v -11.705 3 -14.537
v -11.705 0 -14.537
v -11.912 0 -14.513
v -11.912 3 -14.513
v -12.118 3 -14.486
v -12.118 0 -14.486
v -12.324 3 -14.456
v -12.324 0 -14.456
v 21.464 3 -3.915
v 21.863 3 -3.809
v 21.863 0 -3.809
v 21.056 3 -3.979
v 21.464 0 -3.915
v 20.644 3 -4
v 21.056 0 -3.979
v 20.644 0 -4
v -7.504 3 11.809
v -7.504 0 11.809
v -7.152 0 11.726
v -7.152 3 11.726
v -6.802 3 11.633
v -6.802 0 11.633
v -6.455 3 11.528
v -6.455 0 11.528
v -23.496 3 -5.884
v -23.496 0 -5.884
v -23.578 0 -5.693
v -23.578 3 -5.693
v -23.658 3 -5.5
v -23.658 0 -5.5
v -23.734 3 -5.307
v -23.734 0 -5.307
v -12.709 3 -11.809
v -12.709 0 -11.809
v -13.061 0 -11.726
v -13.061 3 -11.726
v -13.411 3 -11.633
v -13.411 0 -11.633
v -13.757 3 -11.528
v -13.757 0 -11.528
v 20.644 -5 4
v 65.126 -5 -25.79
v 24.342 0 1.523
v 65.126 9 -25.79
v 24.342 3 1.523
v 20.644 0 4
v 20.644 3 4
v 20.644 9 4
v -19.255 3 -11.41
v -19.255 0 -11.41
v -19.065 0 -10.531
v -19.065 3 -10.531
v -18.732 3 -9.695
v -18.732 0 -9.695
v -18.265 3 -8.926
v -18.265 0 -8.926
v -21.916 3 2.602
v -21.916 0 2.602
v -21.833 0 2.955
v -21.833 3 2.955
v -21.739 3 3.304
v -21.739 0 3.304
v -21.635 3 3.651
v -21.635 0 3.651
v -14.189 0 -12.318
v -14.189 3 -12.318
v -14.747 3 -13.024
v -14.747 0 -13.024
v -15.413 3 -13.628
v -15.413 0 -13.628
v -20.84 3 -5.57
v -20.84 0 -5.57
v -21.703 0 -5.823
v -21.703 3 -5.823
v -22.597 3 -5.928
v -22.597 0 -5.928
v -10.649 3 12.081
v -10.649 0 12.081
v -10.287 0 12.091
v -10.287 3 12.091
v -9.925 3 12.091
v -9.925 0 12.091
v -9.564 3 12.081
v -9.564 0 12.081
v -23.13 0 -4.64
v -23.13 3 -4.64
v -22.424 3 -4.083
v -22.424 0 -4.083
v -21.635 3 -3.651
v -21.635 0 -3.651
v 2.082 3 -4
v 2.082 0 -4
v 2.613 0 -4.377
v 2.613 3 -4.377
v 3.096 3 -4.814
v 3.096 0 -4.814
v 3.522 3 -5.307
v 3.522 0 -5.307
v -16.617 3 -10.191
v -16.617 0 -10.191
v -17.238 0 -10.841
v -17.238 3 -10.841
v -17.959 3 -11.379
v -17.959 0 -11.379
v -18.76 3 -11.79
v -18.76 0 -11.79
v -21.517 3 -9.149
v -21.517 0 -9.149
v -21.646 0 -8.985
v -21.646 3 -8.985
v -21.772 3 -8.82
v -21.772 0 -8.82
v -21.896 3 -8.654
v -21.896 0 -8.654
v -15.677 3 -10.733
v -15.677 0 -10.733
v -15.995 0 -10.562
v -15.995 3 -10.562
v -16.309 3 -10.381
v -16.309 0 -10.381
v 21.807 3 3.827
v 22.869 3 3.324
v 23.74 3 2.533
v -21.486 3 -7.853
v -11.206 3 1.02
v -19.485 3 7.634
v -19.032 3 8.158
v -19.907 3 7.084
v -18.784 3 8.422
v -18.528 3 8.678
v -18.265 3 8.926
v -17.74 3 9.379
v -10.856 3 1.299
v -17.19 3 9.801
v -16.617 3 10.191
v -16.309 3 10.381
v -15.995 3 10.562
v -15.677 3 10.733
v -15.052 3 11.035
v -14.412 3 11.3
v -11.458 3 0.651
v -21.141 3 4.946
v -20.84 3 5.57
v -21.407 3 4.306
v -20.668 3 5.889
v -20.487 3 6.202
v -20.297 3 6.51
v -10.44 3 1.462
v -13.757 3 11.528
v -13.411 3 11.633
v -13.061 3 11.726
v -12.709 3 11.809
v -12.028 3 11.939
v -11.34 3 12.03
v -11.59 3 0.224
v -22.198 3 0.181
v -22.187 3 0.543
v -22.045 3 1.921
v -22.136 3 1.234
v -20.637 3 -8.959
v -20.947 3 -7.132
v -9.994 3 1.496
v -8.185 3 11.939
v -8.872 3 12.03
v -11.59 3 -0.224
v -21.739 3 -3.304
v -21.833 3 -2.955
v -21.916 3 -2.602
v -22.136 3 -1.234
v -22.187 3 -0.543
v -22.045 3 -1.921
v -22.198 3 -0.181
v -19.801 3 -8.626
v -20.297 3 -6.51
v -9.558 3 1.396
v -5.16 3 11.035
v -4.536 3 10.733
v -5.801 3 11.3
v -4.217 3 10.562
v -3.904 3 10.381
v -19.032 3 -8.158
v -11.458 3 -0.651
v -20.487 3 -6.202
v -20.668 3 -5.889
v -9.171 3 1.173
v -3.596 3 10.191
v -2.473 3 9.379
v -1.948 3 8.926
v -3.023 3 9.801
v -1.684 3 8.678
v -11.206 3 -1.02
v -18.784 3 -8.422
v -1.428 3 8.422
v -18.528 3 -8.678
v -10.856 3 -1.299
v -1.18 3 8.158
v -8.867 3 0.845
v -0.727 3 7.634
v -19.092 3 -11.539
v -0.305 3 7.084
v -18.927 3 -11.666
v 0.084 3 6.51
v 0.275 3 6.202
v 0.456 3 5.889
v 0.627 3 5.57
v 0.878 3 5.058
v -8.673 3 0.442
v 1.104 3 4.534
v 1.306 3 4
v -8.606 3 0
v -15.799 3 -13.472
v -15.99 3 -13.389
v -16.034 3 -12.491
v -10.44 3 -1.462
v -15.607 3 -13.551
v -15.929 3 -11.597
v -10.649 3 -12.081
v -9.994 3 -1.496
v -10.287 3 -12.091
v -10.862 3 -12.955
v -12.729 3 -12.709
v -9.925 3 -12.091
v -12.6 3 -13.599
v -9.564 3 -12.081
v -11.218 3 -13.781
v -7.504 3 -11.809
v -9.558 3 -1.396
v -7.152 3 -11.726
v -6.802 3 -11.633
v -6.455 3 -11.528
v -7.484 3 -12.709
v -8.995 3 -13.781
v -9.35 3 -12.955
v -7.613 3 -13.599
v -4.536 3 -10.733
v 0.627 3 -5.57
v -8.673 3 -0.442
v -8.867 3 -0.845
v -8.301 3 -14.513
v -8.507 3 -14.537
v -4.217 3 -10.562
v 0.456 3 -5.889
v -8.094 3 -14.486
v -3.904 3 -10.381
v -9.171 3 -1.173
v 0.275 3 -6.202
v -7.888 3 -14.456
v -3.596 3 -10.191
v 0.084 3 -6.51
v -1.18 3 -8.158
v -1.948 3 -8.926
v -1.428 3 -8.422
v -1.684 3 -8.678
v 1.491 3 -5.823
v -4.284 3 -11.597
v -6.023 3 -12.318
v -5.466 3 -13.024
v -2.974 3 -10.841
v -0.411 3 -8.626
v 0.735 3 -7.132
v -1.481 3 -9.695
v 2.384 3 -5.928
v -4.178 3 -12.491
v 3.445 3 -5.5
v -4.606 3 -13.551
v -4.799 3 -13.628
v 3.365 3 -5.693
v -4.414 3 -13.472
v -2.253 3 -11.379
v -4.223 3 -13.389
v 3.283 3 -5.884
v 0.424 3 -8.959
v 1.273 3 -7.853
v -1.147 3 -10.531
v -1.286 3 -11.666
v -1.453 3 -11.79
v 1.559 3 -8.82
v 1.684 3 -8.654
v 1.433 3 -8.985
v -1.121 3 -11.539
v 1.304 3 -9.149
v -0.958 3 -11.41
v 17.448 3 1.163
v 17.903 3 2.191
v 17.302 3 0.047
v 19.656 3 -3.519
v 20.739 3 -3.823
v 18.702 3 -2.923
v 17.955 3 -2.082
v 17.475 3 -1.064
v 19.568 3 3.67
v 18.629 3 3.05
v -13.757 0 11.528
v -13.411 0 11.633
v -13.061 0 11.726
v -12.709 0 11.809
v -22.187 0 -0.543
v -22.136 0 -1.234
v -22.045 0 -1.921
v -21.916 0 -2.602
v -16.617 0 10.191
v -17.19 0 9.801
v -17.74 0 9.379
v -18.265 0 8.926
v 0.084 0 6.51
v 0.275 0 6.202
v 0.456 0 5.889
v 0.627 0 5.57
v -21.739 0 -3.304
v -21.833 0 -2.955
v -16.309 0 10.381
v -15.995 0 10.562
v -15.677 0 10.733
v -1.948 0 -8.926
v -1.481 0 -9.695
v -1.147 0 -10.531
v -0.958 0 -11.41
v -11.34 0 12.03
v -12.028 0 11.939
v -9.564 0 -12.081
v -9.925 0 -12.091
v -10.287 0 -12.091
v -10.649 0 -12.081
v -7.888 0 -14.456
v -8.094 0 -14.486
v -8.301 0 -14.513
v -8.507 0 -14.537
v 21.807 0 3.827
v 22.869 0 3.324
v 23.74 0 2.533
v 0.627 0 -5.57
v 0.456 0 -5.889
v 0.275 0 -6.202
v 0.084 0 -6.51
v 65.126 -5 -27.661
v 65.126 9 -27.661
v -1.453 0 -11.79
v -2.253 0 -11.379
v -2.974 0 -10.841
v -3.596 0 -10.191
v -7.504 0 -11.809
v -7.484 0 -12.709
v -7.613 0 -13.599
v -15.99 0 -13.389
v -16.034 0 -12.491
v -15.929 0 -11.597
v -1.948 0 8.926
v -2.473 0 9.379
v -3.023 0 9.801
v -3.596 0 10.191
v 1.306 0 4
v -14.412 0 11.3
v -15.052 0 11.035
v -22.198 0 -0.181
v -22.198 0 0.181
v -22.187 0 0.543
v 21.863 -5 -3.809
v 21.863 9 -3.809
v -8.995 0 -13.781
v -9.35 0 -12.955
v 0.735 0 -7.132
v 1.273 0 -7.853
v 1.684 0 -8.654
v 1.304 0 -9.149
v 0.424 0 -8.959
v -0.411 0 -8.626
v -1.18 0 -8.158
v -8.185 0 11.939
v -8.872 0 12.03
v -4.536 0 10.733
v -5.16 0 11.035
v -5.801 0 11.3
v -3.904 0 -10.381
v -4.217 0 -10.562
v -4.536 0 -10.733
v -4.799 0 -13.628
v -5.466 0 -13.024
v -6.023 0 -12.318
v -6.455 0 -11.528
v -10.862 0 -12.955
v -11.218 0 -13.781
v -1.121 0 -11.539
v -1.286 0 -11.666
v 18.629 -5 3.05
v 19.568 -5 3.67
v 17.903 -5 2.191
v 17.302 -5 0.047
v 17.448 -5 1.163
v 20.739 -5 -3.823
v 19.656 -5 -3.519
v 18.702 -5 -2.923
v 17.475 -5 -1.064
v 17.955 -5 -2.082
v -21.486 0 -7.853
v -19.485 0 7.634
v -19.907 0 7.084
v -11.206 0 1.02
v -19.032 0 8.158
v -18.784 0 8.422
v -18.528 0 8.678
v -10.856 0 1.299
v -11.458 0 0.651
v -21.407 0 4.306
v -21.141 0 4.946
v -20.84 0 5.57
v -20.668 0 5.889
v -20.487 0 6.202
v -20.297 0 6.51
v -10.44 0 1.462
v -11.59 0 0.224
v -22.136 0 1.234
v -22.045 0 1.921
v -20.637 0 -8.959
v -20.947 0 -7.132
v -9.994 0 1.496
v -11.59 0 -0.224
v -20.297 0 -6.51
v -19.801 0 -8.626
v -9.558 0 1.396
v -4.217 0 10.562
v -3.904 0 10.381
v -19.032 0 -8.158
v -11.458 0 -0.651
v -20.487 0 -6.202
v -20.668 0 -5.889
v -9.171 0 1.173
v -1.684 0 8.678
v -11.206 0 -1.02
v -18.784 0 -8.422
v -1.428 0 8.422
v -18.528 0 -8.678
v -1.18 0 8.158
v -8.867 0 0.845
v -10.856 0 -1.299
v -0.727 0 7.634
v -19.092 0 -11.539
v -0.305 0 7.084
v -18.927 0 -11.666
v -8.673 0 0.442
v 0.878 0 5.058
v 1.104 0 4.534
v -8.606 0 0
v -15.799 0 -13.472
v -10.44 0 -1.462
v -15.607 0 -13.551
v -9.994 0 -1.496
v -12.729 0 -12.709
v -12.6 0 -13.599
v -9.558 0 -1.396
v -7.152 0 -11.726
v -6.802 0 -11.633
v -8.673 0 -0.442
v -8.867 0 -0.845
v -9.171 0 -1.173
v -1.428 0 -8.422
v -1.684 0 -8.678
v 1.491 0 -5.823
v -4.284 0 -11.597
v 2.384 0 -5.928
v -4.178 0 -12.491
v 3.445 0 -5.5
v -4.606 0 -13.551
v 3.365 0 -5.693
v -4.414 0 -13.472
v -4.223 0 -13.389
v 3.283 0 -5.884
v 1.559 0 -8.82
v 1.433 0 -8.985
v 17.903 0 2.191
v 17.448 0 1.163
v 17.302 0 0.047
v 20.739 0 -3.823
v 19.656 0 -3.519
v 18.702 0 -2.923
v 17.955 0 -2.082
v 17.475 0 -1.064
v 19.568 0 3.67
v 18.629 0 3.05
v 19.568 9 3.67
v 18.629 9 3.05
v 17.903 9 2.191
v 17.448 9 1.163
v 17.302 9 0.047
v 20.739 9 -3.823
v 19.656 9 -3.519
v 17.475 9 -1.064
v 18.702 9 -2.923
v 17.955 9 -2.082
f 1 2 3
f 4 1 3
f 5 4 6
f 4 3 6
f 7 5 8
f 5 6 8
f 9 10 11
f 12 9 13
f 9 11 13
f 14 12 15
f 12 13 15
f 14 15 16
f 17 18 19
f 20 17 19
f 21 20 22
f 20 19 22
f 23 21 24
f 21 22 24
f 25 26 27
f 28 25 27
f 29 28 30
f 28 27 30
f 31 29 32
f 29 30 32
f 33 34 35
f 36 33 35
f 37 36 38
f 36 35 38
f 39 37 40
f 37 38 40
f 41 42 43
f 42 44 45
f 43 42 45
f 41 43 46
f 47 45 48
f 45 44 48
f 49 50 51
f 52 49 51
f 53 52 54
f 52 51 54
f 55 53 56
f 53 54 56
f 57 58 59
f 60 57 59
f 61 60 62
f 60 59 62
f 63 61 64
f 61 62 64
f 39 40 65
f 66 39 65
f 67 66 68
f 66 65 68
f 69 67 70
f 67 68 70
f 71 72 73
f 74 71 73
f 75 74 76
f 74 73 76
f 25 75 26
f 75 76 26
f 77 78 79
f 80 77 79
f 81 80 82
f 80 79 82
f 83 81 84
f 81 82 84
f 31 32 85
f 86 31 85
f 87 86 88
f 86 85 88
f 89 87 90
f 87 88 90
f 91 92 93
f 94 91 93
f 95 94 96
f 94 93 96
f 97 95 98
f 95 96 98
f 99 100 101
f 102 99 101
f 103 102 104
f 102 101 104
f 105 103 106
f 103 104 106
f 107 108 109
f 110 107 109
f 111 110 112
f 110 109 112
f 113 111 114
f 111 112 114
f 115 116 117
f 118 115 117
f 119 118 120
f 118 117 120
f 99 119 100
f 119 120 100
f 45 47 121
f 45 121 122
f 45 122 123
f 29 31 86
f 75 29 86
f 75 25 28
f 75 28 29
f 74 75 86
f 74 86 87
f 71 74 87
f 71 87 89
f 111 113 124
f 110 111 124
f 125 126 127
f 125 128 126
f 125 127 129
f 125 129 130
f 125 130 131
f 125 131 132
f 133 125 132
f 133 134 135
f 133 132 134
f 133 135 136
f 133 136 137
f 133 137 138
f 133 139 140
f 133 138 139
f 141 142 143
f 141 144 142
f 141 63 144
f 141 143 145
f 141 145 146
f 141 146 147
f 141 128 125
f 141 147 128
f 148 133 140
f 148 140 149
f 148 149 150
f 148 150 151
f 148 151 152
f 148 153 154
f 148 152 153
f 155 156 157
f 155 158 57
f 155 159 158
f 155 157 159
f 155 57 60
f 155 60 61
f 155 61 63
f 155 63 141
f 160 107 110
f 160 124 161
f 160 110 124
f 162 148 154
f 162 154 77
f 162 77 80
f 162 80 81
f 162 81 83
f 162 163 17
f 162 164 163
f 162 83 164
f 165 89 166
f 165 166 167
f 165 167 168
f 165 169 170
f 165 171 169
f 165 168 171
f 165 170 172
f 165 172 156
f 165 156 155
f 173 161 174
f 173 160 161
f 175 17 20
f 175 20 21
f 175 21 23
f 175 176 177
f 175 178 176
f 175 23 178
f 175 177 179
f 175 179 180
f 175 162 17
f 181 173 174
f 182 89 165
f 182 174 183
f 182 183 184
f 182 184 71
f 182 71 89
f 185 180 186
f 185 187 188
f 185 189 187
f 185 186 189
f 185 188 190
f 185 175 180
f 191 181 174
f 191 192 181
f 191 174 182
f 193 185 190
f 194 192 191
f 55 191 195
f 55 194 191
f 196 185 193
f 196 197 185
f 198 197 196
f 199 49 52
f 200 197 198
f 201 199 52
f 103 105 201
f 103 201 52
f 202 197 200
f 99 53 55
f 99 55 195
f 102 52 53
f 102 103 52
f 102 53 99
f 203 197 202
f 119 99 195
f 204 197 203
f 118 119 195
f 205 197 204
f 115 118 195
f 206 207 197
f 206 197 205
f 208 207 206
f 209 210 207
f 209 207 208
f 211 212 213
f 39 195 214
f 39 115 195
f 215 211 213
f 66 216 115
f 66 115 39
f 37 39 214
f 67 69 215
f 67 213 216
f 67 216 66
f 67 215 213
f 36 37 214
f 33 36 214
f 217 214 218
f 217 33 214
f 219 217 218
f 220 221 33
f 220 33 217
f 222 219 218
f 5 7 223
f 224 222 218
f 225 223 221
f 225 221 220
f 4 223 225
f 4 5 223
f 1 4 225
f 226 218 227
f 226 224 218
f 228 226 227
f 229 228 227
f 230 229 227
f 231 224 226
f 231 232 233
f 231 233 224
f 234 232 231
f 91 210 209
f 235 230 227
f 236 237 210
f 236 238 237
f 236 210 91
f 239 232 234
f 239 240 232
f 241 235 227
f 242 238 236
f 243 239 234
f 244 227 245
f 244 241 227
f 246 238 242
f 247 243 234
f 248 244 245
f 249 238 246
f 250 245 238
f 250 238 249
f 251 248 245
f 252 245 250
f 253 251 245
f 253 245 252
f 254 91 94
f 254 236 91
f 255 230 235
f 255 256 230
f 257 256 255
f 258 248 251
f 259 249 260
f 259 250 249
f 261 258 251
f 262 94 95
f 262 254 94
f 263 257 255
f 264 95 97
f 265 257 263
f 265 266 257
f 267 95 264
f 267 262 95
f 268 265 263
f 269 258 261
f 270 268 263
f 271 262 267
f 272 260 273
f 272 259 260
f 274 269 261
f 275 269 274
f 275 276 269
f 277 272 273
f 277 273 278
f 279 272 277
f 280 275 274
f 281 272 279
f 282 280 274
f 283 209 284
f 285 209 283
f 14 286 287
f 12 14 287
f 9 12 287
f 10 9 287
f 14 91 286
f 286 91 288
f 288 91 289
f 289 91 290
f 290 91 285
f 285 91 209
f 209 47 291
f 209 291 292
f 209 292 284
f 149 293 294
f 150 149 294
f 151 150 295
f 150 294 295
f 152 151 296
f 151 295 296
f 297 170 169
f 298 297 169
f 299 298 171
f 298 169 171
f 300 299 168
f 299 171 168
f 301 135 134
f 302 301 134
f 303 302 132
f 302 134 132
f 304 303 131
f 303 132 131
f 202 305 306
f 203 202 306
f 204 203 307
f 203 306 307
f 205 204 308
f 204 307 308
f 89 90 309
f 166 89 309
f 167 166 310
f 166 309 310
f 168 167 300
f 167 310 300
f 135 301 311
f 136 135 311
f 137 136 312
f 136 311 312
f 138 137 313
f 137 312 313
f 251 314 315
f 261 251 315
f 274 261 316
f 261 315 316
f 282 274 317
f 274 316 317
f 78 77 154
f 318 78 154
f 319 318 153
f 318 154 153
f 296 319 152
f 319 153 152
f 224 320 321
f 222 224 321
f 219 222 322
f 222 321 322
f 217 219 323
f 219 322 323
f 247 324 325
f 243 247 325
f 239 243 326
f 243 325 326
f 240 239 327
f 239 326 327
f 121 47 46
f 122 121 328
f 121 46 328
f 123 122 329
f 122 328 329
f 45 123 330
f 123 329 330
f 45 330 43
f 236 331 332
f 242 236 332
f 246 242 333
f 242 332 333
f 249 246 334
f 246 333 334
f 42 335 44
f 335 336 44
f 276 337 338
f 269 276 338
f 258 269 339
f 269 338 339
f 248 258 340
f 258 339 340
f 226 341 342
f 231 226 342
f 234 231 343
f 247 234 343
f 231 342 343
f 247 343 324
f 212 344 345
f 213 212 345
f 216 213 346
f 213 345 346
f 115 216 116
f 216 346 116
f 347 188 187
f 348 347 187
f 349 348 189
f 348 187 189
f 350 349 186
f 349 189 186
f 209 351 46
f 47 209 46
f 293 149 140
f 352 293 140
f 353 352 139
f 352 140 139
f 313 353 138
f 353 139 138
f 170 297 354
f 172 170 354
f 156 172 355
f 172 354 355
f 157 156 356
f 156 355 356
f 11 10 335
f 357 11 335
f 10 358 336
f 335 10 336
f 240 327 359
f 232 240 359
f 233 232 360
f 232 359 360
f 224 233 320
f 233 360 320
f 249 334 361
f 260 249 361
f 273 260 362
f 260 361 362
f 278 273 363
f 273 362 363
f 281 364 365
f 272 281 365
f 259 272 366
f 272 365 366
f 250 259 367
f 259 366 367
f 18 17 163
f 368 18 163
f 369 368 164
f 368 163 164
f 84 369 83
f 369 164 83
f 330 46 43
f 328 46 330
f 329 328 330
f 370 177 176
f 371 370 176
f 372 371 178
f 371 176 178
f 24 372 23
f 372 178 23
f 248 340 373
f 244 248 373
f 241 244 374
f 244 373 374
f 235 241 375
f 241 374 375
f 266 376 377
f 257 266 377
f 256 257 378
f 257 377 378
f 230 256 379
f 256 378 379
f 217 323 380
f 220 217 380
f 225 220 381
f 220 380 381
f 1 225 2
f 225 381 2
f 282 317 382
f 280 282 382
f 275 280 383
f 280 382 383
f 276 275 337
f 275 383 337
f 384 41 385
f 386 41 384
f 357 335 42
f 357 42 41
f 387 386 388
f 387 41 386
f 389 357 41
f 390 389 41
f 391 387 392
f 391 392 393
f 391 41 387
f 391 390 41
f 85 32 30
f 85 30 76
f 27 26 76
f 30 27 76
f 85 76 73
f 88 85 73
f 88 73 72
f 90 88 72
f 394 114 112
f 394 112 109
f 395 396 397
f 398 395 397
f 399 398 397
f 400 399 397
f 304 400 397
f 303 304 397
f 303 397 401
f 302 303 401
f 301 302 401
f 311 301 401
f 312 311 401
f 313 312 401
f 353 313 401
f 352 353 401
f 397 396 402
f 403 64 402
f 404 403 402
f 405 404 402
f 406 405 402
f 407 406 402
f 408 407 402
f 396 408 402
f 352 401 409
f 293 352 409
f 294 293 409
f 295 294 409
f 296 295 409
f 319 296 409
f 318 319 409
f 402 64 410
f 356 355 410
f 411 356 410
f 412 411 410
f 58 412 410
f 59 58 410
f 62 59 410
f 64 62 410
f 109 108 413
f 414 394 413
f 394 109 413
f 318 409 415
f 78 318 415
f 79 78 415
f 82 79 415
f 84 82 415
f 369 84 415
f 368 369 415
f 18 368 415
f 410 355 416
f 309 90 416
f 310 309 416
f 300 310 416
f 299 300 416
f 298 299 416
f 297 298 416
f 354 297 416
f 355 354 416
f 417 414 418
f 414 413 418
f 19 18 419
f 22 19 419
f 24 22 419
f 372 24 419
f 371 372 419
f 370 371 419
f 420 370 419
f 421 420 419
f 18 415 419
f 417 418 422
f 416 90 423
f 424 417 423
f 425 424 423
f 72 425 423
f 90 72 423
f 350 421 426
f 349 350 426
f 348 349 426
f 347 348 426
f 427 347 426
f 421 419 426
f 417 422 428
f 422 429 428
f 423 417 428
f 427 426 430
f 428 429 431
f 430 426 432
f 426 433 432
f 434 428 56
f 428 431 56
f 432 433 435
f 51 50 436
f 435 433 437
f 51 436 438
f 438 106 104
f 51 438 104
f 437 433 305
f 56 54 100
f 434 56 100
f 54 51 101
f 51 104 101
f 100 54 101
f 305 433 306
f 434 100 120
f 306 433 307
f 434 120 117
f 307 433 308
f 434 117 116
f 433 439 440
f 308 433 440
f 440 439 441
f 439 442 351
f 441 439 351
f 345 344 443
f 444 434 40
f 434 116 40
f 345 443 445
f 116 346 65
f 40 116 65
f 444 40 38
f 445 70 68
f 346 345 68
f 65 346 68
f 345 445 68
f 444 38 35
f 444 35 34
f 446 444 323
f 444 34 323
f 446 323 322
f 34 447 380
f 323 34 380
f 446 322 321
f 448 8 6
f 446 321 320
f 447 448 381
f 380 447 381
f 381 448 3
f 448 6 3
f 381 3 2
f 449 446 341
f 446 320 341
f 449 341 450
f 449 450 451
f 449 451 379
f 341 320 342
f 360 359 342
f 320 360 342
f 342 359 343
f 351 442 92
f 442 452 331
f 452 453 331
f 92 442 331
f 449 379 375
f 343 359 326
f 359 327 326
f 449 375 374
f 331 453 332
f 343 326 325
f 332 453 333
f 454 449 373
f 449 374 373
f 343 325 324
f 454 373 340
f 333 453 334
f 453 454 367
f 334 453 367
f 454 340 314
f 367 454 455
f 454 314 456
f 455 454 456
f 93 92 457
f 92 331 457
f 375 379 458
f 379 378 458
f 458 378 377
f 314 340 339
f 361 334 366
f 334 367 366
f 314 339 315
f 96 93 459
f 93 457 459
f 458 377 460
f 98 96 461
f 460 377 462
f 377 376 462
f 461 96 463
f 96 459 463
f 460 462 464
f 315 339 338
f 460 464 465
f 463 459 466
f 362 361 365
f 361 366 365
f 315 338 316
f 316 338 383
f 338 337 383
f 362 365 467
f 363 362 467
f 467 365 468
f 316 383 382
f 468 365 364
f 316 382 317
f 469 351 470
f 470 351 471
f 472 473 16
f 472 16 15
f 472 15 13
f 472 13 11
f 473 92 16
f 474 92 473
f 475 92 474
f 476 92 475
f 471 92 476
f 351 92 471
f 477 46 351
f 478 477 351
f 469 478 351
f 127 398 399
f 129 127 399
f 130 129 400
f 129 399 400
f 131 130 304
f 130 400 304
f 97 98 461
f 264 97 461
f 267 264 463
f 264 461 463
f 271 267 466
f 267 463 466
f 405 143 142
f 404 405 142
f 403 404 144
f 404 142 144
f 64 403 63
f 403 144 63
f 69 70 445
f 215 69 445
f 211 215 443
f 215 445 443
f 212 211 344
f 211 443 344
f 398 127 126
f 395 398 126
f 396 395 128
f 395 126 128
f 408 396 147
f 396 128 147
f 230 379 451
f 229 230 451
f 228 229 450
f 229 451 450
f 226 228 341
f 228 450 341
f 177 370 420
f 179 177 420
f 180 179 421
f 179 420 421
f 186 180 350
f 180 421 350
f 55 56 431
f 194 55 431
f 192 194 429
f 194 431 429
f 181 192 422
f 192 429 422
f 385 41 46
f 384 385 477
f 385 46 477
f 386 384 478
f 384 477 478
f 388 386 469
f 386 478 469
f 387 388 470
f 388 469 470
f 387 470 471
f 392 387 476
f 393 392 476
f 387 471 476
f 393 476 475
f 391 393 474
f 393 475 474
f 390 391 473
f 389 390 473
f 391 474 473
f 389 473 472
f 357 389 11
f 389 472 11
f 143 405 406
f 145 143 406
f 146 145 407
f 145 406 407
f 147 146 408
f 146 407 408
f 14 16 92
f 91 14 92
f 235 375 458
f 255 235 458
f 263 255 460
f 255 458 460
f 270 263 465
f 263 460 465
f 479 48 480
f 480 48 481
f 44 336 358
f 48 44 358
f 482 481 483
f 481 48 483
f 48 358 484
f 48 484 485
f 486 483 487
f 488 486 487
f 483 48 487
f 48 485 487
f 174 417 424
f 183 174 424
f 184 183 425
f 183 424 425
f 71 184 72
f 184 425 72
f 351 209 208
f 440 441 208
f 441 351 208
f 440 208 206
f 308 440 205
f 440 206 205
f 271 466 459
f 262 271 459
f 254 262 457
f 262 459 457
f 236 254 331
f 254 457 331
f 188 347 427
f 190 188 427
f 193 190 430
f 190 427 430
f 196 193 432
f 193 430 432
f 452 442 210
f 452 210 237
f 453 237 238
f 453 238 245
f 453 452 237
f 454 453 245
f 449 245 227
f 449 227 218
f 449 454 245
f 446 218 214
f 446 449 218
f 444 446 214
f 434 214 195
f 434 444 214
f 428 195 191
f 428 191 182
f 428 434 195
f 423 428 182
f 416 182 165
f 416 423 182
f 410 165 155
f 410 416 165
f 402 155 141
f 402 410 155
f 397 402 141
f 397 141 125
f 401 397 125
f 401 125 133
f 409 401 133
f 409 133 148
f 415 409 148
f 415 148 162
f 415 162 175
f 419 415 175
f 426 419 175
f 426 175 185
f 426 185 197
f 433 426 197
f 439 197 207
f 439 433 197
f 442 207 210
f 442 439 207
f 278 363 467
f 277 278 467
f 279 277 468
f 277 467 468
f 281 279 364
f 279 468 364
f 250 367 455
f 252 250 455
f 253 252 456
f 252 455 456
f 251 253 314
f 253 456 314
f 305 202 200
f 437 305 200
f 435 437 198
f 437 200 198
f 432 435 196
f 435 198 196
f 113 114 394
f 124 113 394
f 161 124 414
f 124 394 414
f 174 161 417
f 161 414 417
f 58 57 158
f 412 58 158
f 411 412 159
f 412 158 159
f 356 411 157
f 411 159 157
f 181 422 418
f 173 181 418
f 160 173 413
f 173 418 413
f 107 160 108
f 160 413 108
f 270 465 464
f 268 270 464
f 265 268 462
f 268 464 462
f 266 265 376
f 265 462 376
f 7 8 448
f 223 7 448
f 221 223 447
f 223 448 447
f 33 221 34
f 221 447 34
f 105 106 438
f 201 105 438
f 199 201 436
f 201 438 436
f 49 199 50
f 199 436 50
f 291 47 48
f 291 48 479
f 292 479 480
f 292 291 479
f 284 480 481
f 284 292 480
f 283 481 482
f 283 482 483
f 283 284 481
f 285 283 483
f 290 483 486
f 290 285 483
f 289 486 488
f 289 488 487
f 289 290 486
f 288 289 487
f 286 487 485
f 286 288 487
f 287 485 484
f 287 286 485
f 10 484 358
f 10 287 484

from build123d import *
from build123d.topology import SkipClean

# Parameters (mm, degrees)
SKETCH1_R                = 1.5
BOSS_EXTRUDE1_DEPTH      = 3
CUT_EXTRUDE1_START       = -10
CUT_EXTRUDE1_DEPTH       = 10
BOSS_EXTRUDE2_DEPTH      = 6
BOSS_EXTRUDE2_DEPTH_BACK = 8


with BuildPart() as part:
    # Sketch1 → Boss-Extrude1 (new body)
    with BuildSketch(Plane(origin=(0, 0, 0), x_dir=(1, 0, 0), z_dir=(0, 1, 0))):
        with BuildLine():
            Line((20.643657446, 4), (2.081641936, 4))
            ThreePointArc((2.081641936, 4), (2.861028333, 4.588201733), (3.521749436, 5.30713988))
            ThreePointArc((3.521749436, 5.30713988), (3.405395609, 5.596745198), (3.282888305, 5.883801663))
            ThreePointArc((3.282888305, 5.883801663), (1.93527598, 5.894040025), (0.627094961, 5.57027124))
            ThreePointArc((0.627094961, 5.57027124), (0.366286148, 6.046375), (0.084372603, 6.510293938))
            ThreePointArc((0.084372603, 6.510293938), (1.018855105, 7.48132754), (1.683794586, 8.65351323))
            ThreePointArc((1.683794586, 8.65351323), (1.496450048, 8.903135899), (1.303821399, 9.148703928))
            ThreePointArc((1.303821399, 9.148703928), (-0.000522033, 8.809805691), (-1.180330337, 8.158486898))
            ThreePointArc((-1.180330337, 8.158486898), (-1.555477026, 8.550865528), (-1.947855656, 8.926012217))
            ThreePointArc((-1.947855656, 8.926012217), (-1.296536862, 10.105820521), (-0.957638625, 11.410163953))
            ThreePointArc((-0.957638625, 11.410163953), (-1.203206655, 11.602792602), (-1.452829324, 11.79013714))
            ThreePointArc((-1.452829324, 11.79013714), (-2.625015014, 11.125197659), (-3.596048616, 10.190715157))
            ThreePointArc((-3.596048616, 10.190715157), (-4.059967554, 10.472628702), (-4.536071314, 10.733437515))
            ThreePointArc((-4.536071314, 10.733437515), (-4.212302529, 12.041618533), (-4.222540891, 13.389230859))
            ThreePointArc((-4.222540891, 13.389230859), (-4.509597355, 13.511738163), (-4.799202674, 13.62809199))
            ThreePointArc((-4.799202674, 13.62809199), (-5.759348103, 12.682425791), (-6.455432668, 11.528463019))
            ThreePointArc((-6.455432668, 11.528463019), (-6.976508546, 11.680699536), (-7.503891752, 11.809396783))
            ThreePointArc((-7.503891752, 11.809396783), (-7.529737283, 13.156800143), (-7.888414517, 14.455843809))
            ThreePointArc((-7.888414517, 14.455843809), (-8.197396993, 14.499881098), (-8.507248835, 14.537314892))
            ThreePointArc((-8.507248835, 14.537314892), (-9.18992168, 13.375367565), (-9.563620196, 12.080565177))
            ThreePointArc((-9.563620196, 12.080565177), (-10.106342554, 12.09275), (-10.649064912, 12.080565177))
            ThreePointArc((-10.649064912, 12.080565177), (-11.022763428, 13.375367565), (-11.705436272, 14.537314892))
            ThreePointArc((-11.705436272, 14.537314892), (-12.015288115, 14.499881098), (-12.324270591, 14.455843809))
            ThreePointArc((-12.324270591, 14.455843809), (-12.682947825, 13.156800143), (-12.708793355, 11.809396783))
            ThreePointArc((-12.708793355, 11.809396783), (-13.236176561, 11.680699536), (-13.757252439, 11.528463019))
            ThreePointArc((-13.757252439, 11.528463019), (-14.453337005, 12.682425791), (-15.413482434, 13.62809199))
            ThreePointArc((-15.413482434, 13.62809199), (-15.703087752, 13.511738163), (-15.990144217, 13.389230859))
            ThreePointArc((-15.990144217, 13.389230859), (-16.000382579, 12.041618533), (-15.676613793, 10.733437515))
            ThreePointArc((-15.676613793, 10.733437515), (-16.152717554, 10.472628702), (-16.616636492, 10.190715157))
            ThreePointArc((-16.616636492, 10.190715157), (-17.587670094, 11.125197659), (-18.759855783, 11.79013714))
            ThreePointArc((-18.759855783, 11.79013714), (-19.009478453, 11.602792602), (-19.255046482, 11.410163953))
            ThreePointArc((-19.255046482, 11.410163953), (-18.916148245, 10.105820521), (-18.264829452, 8.926012217))
            ThreePointArc((-18.264829452, 8.926012217), (-18.657208082, 8.550865528), (-19.032354771, 8.158486898))
            ThreePointArc((-19.032354771, 8.158486898), (-20.212163074, 8.809805691), (-21.516506507, 9.148703928))
            ThreePointArc((-21.516506507, 9.148703928), (-21.709135156, 8.903135899), (-21.896479694, 8.65351323))
            ThreePointArc((-21.896479694, 8.65351323), (-21.231540213, 7.48132754), (-20.297057711, 6.510293938))
            ThreePointArc((-20.297057711, 6.510293938), (-20.578971255, 6.046375), (-20.839780068, 5.57027124))
            ThreePointArc((-20.839780068, 5.57027124), (-22.147961087, 5.894040025), (-23.495573413, 5.883801663))
            ThreePointArc((-23.495573413, 5.883801663), (-23.618080717, 5.596745198), (-23.734434544, 5.30713988))
            ThreePointArc((-23.734434544, 5.30713988), (-22.788768345, 4.346994451), (-21.634805572, 3.650909885))
            ThreePointArc((-21.634805572, 3.650909885), (-21.78704209, 3.129834008), (-21.915739337, 2.602450802))
            ThreePointArc((-21.915739337, 2.602450802), (-23.263142697, 2.576605271), (-24.562186363, 2.217928037))
            ThreePointArc((-24.562186363, 2.217928037), (-24.606223651, 1.908945561), (-24.643657446, 1.599093719))
            ThreePointArc((-24.643657446, 1.599093719), (-23.481710119, 0.916420874), (-22.186907731, 0.542722358))
            ThreePointArc((-22.186907731, 0.542722358), (-22.199092554, 0), (-22.186907731, -0.542722358))
            ThreePointArc((-22.186907731, -0.542722358), (-23.481710119, -0.916420874), (-24.643657446, -1.599093719))
            ThreePointArc((-24.643657446, -1.599093719), (-24.606223651, -1.908945561), (-24.562186363, -2.217928037))
            ThreePointArc((-24.562186363, -2.217928037), (-23.263142697, -2.576605271), (-21.915739337, -2.602450802))
            ThreePointArc((-21.915739337, -2.602450802), (-21.78704209, -3.129834008), (-21.634805572, -3.650909885))
            ThreePointArc((-21.634805572, -3.650909885), (-22.788768345, -4.346994451), (-23.734434544, -5.30713988))
            ThreePointArc((-23.734434544, -5.30713988), (-23.618080717, -5.596745198), (-23.495573413, -5.883801663))
            ThreePointArc((-23.495573413, -5.883801663), (-22.147961087, -5.894040025), (-20.839780068, -5.57027124))
            ThreePointArc((-20.839780068, -5.57027124), (-20.578971255, -6.046375), (-20.297057711, -6.510293938))
            ThreePointArc((-20.297057711, -6.510293938), (-21.231540213, -7.48132754), (-21.896479694, -8.65351323))
            ThreePointArc((-21.896479694, -8.65351323), (-21.709135156, -8.903135899), (-21.516506507, -9.148703928))
            ThreePointArc((-21.516506507, -9.148703928), (-20.212163074, -8.809805691), (-19.032354771, -8.158486898))
            ThreePointArc((-19.032354771, -8.158486898), (-18.657208082, -8.550865528), (-18.264829452, -8.926012217))
            ThreePointArc((-18.264829452, -8.926012217), (-18.916148245, -10.105820521), (-19.255046482, -11.410163953))
            ThreePointArc((-19.255046482, -11.410163953), (-19.009478453, -11.602792602), (-18.759855783, -11.79013714))
            ThreePointArc((-18.759855783, -11.79013714), (-17.587670094, -11.125197659), (-16.616636492, -10.190715157))
            ThreePointArc((-16.616636492, -10.190715157), (-16.152717554, -10.472628702), (-15.676613793, -10.733437515))
            ThreePointArc((-15.676613793, -10.733437515), (-16.000382579, -12.041618533), (-15.990144217, -13.389230859))
            ThreePointArc((-15.990144217, -13.389230859), (-15.703087752, -13.511738163), (-15.413482434, -13.62809199))
            ThreePointArc((-15.413482434, -13.62809199), (-14.453337005, -12.682425791), (-13.757252439, -11.528463019))
            ThreePointArc((-13.757252439, -11.528463019), (-13.236176561, -11.680699536), (-12.708793355, -11.809396783))
            ThreePointArc((-12.708793355, -11.809396783), (-12.682947825, -13.156800143), (-12.324270591, -14.455843809))
            ThreePointArc((-12.324270591, -14.455843809), (-12.015288115, -14.499881098), (-11.705436272, -14.537314892))
            ThreePointArc((-11.705436272, -14.537314892), (-11.022763428, -13.375367565), (-10.649064912, -12.080565177))
            ThreePointArc((-10.649064912, -12.080565177), (-10.106342554, -12.09275), (-9.563620196, -12.080565177))
            ThreePointArc((-9.563620196, -12.080565177), (-9.18992168, -13.375367565), (-8.507248835, -14.537314892))
            ThreePointArc((-8.507248835, -14.537314892), (-8.197396993, -14.499881098), (-7.888414517, -14.455843809))
            ThreePointArc((-7.888414517, -14.455843809), (-7.529737283, -13.156800143), (-7.503891752, -11.809396783))
            ThreePointArc((-7.503891752, -11.809396783), (-6.976508546, -11.680699536), (-6.455432668, -11.528463019))
            ThreePointArc((-6.455432668, -11.528463019), (-5.759348103, -12.682425791), (-4.799202674, -13.62809199))
            ThreePointArc((-4.799202674, -13.62809199), (-4.509597355, -13.511738163), (-4.222540891, -13.389230859))
            ThreePointArc((-4.222540891, -13.389230859), (-4.212302529, -12.041618533), (-4.536071314, -10.733437515))
            ThreePointArc((-4.536071314, -10.733437515), (-4.059967554, -10.472628702), (-3.596048616, -10.190715157))
            ThreePointArc((-3.596048616, -10.190715157), (-2.625015014, -11.125197659), (-1.452829324, -11.79013714))
            ThreePointArc((-1.452829324, -11.79013714), (-1.203206655, -11.602792602), (-0.957638625, -11.410163953))
            ThreePointArc((-0.957638625, -11.410163953), (-1.296536862, -10.105820521), (-1.947855656, -8.926012217))
            ThreePointArc((-1.947855656, -8.926012217), (-1.555477026, -8.550865528), (-1.180330337, -8.158486898))
            ThreePointArc((-1.180330337, -8.158486898), (-0.000522033, -8.809805691), (1.303821399, -9.148703928))
            ThreePointArc((1.303821399, -9.148703928), (1.496450048, -8.903135899), (1.683794586, -8.65351323))
            ThreePointArc((1.683794586, -8.65351323), (1.018855105, -7.48132754), (0.084372603, -6.510293938))
            ThreePointArc((0.084372603, -6.510293938), (0.366286148, -6.046375), (0.627094961, -5.57027124))
            ThreePointArc((0.627094961, -5.57027124), (1.93527598, -5.894040025), (3.282888305, -5.883801663))
            ThreePointArc((3.282888305, -5.883801663), (3.405395609, -5.596745198), (3.521749436, -5.30713988))
            ThreePointArc((3.521749436, -5.30713988), (2.861028333, -4.588201733), (2.081641936, -4))
            Line((2.081641936, -4), (20.643657446, -4))
            ThreePointArc((20.643657446, -4), (24.643657446, 0), (20.643657446, 4))
        make_face()
        with Locations((-10.106342554, 0)):
            Circle(SKETCH1_R, mode=Mode.SUBTRACT)
        with Locations((20.643657446, 0)):
            Circle(SKETCH1_R, mode=Mode.SUBTRACT)
    extrude(amount=BOSS_EXTRUDE1_DEPTH)

    # Sketch2 → Cut-Extrude1 (cut)
    with SkipClean():  # the faces are left unmerged after this step: merging them gives an invalid solid
        with BuildSketch(Plane(origin=(0, 3, 0), x_dir=(1, 0, 0), z_dir=(0, 1, 0)).offset(CUT_EXTRUDE1_START)):
            with BuildLine():
                ThreePointArc((3.521749436, -5.30713988), (2.861028333, -4.588201733), (2.081641936, -4))
                Line((2.081641936, -4), (1.305695063, -4))
                ThreePointArc((1.305695063, -4), (0.994195953, -4.797149927), (0.627094961, -5.57027124))
                ThreePointArc((0.627094961, -5.57027124), (1.93527598, -5.894040025), (3.282888305, -5.883801663))
                ThreePointArc((3.282888305, -5.883801663), (3.405395609, -5.596745198), (3.521749436, -5.30713988))
            make_face()
            with BuildLine():
                ThreePointArc((1.683794586, -8.65351323), (1.018855105, -7.48132754), (0.084372603, -6.510293938))
                ThreePointArc((0.084372603, -6.510293938), (-0.512518948, -7.361599771), (-1.180330337, -8.158486898))
                ThreePointArc((-1.180330337, -8.158486898), (-0.000522033, -8.809805691), (1.303821399, -9.148703928))
                ThreePointArc((1.303821399, -9.148703928), (1.496450048, -8.903135899), (1.683794586, -8.65351323))
            make_face()
            with BuildLine():
                ThreePointArc((-0.957638625, -11.410163953), (-1.296536862, -10.105820521), (-1.947855656, -8.926012217))
                ThreePointArc((-1.947855656, -8.926012217), (-2.744742783, -9.593823606), (-3.596048616, -10.190715157))
                ThreePointArc((-3.596048616, -10.190715157), (-2.625015014, -11.125197659), (-1.452829324, -11.79013714))
                ThreePointArc((-1.452829324, -11.79013714), (-1.203206655, -11.602792602), (-0.957638625, -11.410163953))
            make_face()
            with BuildLine():
                ThreePointArc((-4.222540891, -13.389230859), (-4.212302529, -12.041618533), (-4.536071314, -10.733437515))
                ThreePointArc((-4.536071314, -10.733437515), (-5.478647477, -11.172244217), (-6.455432668, -11.528463019))
                ThreePointArc((-6.455432668, -11.528463019), (-5.759348103, -12.682425791), (-4.799202674, -13.62809199))
                ThreePointArc((-4.799202674, -13.62809199), (-4.509597355, -13.511738163), (-4.222540891, -13.389230859))
            make_face()
            with BuildLine():
                ThreePointArc((-7.888414517, -14.455843809), (-7.529737283, -13.156800143), (-7.503891752, -11.809396783))
                ThreePointArc((-7.503891752, -11.809396783), (-8.527921943, -11.989294847), (-9.563620196, -12.080565177))
                ThreePointArc((-9.563620196, -12.080565177), (-9.18992168, -13.375367565), (-8.507248835, -14.537314892))
                ThreePointArc((-8.507248835, -14.537314892), (-8.197396993, -14.499881098), (-7.888414517, -14.455843809))
            make_face()
            with BuildLine():
                ThreePointArc((-11.705436272, -14.537314892), (-11.022763428, -13.375367565), (-10.649064912, -12.080565177))
                ThreePointArc((-10.649064912, -12.080565177), (-11.684763165, -11.989294847), (-12.708793355, -11.809396783))
                ThreePointArc((-12.708793355, -11.809396783), (-12.682947825, -13.156800143), (-12.324270591, -14.455843809))
                ThreePointArc((-12.324270591, -14.455843809), (-12.015288115, -14.499881098), (-11.705436272, -14.537314892))
            make_face()
            with BuildLine():
                ThreePointArc((-15.413482434, -13.62809199), (-14.453337005, -12.682425791), (-13.757252439, -11.528463019))
                ThreePointArc((-13.757252439, -11.528463019), (-14.734037631, -11.172244217), (-15.676613793, -10.733437515))
                ThreePointArc((-15.676613793, -10.733437515), (-16.000382579, -12.041618533), (-15.990144217, -13.389230859))
                ThreePointArc((-15.990144217, -13.389230859), (-15.703087752, -13.511738163), (-15.413482434, -13.62809199))
            make_face()
            with BuildLine():
                ThreePointArc((-18.759855783, -11.79013714), (-17.587670094, -11.125197659), (-16.616636492, -10.190715157))
                ThreePointArc((-16.616636492, -10.190715157), (-17.467942324, -9.593823606), (-18.264829452, -8.926012217))
                ThreePointArc((-18.264829452, -8.926012217), (-18.916148245, -10.105820521), (-19.255046482, -11.410163953))
                ThreePointArc((-19.255046482, -11.410163953), (-19.009478453, -11.602792602), (-18.759855783, -11.79013714))
            make_face()
            with BuildLine():
                ThreePointArc((-21.516506507, -9.148703928), (-20.212163074, -8.809805691), (-19.032354771, -8.158486898))
                ThreePointArc((-19.032354771, -8.158486898), (-19.70016616, -7.361599771), (-20.297057711, -6.510293938))
                ThreePointArc((-20.297057711, -6.510293938), (-21.231540213, -7.48132754), (-21.896479694, -8.65351323))
                ThreePointArc((-21.896479694, -8.65351323), (-21.709135156, -8.903135899), (-21.516506507, -9.148703928))
            make_face()
            with BuildLine():
                ThreePointArc((-23.495573413, -5.883801663), (-22.147961087, -5.894040025), (-20.839780068, -5.57027124))
                ThreePointArc((-20.839780068, -5.57027124), (-21.278586771, -4.627695077), (-21.634805572, -3.650909885))
                ThreePointArc((-21.634805572, -3.650909885), (-22.788768345, -4.346994451), (-23.734434544, -5.30713988))
                ThreePointArc((-23.734434544, -5.30713988), (-23.618080717, -5.596745198), (-23.495573413, -5.883801663))
            make_face()
            with BuildLine():
                ThreePointArc((-24.562186363, -2.217928037), (-23.263142697, -2.576605271), (-21.915739337, -2.602450802))
                ThreePointArc((-21.915739337, -2.602450802), (-22.095637401, -1.578420611), (-22.186907731, -0.542722358))
                ThreePointArc((-22.186907731, -0.542722358), (-23.481710119, -0.916420874), (-24.643657446, -1.599093719))
                ThreePointArc((-24.643657446, -1.599093719), (-24.606223651, -1.908945561), (-24.562186363, -2.217928037))
            make_face()
            with BuildLine():
                ThreePointArc((-22.186907731, 0.542722358), (-22.095637401, 1.578420611), (-21.915739337, 2.602450802))
                ThreePointArc((-21.915739337, 2.602450802), (-23.263142697, 2.576605271), (-24.562186363, 2.217928037))
                ThreePointArc((-24.562186363, 2.217928037), (-24.606223651, 1.908945561), (-24.643657446, 1.599093719))
                ThreePointArc((-24.643657446, 1.599093719), (-23.481710119, 0.916420874), (-22.186907731, 0.542722358))
            make_face()
        extrude(amount=CUT_EXTRUDE1_DEPTH, mode=Mode.SUBTRACT)

    # Sketch3 → Boss-Extrude2 (add, two sides: drawn at the far end of the back side and taken through both)
    with SkipClean():  # the faces are left unmerged after this step: merging them gives an invalid solid
        with BuildSketch(Plane(origin=(0, 3, 0), x_dir=(1, 0, 0), z_dir=(0, 1, 0)).offset(-BOSS_EXTRUDE2_DEPTH_BACK)):
            with BuildLine():
                Line((21.863468117, 3.809470032), (65.125813964, 27.66054744))
                Line((65.125813964, 27.66054744), (65.125813964, 25.790000621))
                Line((65.125813964, 25.790000621), (20.643657446, -4))
                ThreePointArc((20.643657446, -4), (17.348827766, 0.514640352), (21.863468117, 3.809470032))
            make_face()
        extrude(amount=BOSS_EXTRUDE2_DEPTH + BOSS_EXTRUDE2_DEPTH_BACK)


solid = part.part
